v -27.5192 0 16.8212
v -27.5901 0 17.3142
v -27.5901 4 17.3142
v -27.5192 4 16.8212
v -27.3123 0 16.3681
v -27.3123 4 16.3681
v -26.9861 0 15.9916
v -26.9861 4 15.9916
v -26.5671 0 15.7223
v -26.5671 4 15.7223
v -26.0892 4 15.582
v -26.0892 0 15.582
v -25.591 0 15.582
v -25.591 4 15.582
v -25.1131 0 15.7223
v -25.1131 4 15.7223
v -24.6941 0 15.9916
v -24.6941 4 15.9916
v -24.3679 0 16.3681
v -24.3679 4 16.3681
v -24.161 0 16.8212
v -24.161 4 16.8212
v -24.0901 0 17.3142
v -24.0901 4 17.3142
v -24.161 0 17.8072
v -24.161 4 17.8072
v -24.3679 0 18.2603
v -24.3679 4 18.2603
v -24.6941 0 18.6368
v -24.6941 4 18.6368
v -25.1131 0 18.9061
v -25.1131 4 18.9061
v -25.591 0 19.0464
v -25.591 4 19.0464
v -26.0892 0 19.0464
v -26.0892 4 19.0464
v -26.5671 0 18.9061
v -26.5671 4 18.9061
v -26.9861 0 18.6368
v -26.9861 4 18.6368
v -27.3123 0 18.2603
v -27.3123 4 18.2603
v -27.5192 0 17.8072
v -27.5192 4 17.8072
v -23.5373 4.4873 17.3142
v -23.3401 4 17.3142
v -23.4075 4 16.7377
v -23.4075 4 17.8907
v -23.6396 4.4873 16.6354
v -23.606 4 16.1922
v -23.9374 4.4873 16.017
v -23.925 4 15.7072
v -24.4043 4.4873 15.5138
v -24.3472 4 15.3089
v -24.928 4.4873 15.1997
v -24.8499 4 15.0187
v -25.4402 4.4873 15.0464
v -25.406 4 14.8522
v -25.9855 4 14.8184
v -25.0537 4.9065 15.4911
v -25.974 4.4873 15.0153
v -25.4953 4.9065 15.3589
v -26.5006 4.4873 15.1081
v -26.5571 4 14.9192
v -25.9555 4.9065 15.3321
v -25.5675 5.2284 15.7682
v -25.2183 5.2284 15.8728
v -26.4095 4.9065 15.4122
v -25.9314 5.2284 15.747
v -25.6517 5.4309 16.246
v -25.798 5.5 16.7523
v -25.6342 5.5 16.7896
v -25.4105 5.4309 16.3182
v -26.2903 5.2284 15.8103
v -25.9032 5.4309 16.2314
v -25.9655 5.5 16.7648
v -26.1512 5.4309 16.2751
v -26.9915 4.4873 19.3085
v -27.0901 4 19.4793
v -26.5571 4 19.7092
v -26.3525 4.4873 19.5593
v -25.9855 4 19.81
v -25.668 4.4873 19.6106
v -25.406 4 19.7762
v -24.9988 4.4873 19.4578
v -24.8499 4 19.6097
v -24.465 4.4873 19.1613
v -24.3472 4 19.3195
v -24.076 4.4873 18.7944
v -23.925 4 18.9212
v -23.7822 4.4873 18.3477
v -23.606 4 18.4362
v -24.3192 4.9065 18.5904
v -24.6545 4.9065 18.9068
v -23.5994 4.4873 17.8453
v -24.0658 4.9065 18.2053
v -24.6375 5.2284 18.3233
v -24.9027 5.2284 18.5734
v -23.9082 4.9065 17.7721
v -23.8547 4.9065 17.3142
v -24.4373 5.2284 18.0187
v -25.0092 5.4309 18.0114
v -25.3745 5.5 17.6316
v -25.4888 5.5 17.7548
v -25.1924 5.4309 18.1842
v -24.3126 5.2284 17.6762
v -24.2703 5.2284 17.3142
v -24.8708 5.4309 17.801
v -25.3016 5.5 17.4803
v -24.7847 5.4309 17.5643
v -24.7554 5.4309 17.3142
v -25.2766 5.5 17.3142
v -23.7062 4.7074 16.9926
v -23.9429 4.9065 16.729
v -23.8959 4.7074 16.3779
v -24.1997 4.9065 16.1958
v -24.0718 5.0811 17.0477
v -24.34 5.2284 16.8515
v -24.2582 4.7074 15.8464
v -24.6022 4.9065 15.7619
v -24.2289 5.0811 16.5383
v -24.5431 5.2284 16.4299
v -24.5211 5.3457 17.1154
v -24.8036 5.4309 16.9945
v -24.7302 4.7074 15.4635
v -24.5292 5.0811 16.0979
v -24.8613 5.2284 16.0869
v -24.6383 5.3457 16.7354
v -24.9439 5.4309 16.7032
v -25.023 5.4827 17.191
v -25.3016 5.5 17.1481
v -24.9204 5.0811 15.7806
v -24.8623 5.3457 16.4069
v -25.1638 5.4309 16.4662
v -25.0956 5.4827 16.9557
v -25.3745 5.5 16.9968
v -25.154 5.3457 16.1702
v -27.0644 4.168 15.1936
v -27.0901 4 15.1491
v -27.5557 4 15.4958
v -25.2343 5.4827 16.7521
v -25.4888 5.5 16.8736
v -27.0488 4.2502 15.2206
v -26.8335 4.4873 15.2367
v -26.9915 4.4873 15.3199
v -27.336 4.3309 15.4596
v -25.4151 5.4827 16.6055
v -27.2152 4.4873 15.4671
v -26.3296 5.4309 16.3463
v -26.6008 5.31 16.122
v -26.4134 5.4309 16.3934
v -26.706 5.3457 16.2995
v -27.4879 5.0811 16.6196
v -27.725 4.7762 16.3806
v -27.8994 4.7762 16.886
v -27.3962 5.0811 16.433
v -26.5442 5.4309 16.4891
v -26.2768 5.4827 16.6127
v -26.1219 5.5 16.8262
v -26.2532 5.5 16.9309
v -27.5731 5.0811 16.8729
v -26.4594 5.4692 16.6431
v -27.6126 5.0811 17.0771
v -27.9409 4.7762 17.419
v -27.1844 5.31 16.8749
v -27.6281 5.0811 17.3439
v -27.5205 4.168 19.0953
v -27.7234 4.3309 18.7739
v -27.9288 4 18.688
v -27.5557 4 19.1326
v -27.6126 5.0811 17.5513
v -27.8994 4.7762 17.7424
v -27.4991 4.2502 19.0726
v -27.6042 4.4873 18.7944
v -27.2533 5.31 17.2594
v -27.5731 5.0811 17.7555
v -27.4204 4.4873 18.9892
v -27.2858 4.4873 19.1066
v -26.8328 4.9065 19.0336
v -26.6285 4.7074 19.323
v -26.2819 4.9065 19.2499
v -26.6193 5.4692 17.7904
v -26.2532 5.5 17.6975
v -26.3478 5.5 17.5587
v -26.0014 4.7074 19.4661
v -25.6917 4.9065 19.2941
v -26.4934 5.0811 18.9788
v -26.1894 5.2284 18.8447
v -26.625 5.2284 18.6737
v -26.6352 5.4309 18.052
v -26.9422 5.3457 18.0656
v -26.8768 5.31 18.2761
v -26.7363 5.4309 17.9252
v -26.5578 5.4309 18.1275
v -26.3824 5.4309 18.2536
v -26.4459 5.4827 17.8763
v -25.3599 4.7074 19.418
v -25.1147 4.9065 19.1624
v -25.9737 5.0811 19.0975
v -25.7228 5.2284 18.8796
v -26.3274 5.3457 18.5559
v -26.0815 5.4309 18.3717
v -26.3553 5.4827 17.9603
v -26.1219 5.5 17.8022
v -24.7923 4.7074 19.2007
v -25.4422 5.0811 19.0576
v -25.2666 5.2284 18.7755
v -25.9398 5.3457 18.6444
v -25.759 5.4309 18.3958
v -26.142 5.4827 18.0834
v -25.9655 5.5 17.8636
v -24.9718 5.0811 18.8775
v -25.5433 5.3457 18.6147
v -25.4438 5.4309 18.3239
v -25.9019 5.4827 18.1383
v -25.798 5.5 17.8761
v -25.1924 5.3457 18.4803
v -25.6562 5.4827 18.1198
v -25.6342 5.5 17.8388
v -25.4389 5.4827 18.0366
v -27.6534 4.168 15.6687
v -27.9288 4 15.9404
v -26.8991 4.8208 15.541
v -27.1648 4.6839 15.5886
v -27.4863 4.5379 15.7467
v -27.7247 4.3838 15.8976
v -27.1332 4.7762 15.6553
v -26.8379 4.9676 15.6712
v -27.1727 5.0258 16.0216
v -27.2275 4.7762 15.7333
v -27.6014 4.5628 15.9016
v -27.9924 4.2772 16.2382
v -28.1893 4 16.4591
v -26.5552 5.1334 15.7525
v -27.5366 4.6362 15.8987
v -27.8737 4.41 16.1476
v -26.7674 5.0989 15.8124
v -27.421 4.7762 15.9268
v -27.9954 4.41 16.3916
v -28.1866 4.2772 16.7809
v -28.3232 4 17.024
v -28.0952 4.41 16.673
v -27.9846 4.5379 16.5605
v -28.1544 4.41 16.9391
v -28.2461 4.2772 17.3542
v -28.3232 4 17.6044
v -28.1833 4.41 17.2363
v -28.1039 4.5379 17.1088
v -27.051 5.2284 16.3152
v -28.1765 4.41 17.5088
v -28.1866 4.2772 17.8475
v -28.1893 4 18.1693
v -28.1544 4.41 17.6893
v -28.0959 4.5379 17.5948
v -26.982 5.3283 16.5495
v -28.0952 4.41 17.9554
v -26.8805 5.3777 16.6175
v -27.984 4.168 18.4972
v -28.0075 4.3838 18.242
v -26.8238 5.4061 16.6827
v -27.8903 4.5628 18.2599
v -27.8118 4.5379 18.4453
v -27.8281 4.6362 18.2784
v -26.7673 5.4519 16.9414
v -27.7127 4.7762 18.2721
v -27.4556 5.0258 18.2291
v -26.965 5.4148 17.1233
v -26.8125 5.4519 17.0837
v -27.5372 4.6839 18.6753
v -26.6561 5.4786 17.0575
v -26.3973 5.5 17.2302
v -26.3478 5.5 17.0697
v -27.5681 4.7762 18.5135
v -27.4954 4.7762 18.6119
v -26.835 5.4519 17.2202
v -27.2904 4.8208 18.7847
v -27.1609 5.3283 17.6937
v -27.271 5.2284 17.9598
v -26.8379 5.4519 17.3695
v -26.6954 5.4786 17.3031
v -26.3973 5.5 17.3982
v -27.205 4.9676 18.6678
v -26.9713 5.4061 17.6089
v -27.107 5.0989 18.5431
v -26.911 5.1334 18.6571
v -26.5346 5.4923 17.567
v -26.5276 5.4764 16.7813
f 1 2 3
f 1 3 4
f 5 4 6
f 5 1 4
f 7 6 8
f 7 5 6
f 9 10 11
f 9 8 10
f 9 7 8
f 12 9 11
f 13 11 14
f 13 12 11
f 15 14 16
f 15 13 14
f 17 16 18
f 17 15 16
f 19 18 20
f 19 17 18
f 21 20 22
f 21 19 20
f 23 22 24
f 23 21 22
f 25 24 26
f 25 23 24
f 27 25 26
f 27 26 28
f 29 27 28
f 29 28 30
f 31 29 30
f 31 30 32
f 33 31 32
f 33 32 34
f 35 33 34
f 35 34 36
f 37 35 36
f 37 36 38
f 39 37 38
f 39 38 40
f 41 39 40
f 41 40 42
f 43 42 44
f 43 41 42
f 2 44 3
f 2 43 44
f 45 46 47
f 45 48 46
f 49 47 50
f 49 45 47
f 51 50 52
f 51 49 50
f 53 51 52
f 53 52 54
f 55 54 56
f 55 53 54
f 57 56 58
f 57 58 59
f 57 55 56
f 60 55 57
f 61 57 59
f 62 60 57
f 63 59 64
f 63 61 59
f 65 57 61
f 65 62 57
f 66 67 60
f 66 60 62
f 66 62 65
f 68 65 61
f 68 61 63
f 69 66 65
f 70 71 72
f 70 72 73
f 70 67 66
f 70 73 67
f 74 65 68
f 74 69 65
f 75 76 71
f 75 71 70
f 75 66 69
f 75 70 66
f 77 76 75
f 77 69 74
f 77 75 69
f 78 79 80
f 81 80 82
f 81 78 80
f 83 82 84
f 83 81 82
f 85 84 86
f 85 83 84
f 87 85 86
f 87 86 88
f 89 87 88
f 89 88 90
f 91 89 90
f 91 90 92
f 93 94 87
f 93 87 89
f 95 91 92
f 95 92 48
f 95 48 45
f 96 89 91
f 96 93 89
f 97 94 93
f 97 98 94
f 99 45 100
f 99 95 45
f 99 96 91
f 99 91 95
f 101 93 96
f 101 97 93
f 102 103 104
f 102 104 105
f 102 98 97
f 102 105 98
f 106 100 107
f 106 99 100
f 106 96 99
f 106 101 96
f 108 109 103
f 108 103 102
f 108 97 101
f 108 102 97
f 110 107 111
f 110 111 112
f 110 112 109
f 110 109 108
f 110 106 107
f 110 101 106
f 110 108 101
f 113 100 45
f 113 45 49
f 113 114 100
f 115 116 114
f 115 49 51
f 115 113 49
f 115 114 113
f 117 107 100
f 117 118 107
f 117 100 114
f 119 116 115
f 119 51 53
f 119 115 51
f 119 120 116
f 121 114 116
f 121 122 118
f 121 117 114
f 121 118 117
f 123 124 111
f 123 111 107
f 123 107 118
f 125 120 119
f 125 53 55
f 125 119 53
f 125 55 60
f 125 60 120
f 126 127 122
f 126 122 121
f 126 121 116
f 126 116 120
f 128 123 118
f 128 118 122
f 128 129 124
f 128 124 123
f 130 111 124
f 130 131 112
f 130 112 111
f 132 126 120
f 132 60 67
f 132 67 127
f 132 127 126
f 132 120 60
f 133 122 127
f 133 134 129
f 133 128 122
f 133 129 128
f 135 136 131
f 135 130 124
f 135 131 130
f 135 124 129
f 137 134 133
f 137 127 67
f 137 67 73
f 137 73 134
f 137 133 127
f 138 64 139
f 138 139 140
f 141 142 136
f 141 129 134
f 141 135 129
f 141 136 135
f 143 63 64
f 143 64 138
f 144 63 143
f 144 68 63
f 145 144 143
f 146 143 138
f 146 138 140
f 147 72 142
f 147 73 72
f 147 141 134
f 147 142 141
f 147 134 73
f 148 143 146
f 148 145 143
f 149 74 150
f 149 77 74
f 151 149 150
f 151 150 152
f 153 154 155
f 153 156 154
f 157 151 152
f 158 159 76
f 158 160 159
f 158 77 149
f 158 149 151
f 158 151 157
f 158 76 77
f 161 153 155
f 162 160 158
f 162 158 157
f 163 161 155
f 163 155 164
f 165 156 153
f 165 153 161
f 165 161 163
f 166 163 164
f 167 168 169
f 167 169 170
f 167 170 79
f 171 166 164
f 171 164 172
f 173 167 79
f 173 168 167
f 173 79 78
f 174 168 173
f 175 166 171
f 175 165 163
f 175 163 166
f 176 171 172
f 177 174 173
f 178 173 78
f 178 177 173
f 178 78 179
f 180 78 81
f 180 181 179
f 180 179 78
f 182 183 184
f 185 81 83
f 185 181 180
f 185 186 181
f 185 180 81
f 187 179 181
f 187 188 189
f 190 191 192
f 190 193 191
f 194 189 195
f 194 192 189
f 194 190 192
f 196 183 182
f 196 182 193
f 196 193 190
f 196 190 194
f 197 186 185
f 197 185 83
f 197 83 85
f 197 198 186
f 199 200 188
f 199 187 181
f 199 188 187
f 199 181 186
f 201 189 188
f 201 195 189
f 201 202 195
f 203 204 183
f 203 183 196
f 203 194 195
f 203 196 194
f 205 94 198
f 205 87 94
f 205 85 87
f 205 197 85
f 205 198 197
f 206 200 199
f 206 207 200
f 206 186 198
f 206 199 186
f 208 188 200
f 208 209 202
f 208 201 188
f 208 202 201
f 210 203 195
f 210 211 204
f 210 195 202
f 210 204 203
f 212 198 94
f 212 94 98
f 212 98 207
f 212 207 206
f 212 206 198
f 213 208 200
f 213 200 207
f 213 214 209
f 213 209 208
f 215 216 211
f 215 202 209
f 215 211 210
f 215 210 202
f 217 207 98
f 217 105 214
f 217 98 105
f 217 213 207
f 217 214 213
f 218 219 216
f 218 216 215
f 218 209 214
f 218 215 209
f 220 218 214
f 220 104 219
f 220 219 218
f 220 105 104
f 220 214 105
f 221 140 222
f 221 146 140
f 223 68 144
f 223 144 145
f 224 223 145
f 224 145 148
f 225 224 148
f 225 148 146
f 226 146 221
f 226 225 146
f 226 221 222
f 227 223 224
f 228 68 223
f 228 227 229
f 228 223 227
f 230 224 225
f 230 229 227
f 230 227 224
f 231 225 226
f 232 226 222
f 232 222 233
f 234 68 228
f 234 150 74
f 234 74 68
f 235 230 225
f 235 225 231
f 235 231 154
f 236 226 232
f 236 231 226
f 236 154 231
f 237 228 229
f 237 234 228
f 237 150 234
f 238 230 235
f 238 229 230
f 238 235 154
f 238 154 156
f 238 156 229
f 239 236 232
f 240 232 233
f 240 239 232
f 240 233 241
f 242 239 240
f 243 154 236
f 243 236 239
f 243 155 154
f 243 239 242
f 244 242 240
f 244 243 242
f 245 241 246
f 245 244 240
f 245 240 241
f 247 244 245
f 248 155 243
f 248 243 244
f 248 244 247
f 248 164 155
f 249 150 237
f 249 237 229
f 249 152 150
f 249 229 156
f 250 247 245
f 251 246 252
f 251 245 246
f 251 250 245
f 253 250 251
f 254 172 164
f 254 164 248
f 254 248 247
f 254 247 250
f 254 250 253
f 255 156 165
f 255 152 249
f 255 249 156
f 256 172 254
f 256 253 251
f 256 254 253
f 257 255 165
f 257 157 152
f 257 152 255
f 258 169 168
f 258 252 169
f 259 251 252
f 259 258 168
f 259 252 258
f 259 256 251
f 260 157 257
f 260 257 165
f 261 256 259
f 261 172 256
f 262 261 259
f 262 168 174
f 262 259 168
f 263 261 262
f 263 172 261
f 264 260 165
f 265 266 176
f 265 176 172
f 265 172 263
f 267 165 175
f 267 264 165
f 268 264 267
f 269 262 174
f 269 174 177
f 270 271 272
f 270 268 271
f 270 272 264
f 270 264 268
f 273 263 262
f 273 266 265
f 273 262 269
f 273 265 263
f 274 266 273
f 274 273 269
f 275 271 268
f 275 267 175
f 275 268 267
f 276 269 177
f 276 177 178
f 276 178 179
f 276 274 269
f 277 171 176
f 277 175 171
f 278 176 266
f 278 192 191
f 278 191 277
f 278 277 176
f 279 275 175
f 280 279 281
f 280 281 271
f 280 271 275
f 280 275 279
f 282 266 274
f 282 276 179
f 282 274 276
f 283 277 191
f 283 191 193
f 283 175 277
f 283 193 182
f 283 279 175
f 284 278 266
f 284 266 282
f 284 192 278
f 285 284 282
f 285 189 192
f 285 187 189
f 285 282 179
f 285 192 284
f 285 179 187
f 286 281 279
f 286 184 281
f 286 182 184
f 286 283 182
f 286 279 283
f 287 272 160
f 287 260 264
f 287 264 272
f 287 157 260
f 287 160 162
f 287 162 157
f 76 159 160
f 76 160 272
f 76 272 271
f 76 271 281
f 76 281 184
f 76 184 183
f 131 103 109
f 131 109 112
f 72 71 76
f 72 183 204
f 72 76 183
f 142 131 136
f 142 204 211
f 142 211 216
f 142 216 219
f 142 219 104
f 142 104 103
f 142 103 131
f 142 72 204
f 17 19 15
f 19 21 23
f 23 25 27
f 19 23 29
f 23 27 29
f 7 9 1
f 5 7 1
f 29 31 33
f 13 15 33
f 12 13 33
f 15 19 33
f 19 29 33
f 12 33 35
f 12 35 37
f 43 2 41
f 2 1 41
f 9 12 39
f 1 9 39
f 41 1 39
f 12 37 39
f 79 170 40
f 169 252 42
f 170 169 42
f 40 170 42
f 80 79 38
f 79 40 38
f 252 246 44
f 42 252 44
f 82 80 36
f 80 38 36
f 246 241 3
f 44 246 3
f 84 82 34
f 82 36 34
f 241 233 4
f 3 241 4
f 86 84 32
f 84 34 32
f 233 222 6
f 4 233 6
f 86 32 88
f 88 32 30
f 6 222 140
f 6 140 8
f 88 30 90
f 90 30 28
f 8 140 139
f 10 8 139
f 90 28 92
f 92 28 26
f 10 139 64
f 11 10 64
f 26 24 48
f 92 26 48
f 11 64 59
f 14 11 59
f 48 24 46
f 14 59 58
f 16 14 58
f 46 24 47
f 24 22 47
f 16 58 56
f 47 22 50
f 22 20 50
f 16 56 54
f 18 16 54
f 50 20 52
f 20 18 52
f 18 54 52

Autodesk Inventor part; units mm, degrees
ref_plane "YZ Plane" through (0, 0, 0) normal (1, 0, 0) x (0, 1, 0)
ref_plane "XZ Plane" through (0, 0, 0) normal (0, 1, 0) x (-1, 0, 0)
ref_plane "XY Plane" through (0, 0, 0) normal (0, 0, 1) x (1, 0, 0)
sketch "Sketch1" plane through (0, 0, 0) normal (0, 1, 0) x (-1, 0, 0)
  circle A0 centre (25.8401, 17.3142) radius 1.75
  point P0 (0, 0)
  dimension "d0" = 3.5
extrude "Extrusion1" add sketch "Sketch1" along normal blind 4
thread "Thread1" size "M3.5x0.6" class "6g" standard "ANSI Metric M Profile" full length
sketch "Sketch2" plane through (-25.8401, 4, 17.3142) normal (0, 1, 0) x (1, 0, 0)
  circle A0 centre (0, 0) radius 2.5
  point P0 (25.8401, 17.3142)
  dimension "d5" = 5
extrude "Extrusion2" add sketch "Sketch2" along normal blind 1.5
fillet "Fillet1" radius 2 1 edges at (-28.3401, 5.5, 17.3142)
properties part number "screwLarge"
